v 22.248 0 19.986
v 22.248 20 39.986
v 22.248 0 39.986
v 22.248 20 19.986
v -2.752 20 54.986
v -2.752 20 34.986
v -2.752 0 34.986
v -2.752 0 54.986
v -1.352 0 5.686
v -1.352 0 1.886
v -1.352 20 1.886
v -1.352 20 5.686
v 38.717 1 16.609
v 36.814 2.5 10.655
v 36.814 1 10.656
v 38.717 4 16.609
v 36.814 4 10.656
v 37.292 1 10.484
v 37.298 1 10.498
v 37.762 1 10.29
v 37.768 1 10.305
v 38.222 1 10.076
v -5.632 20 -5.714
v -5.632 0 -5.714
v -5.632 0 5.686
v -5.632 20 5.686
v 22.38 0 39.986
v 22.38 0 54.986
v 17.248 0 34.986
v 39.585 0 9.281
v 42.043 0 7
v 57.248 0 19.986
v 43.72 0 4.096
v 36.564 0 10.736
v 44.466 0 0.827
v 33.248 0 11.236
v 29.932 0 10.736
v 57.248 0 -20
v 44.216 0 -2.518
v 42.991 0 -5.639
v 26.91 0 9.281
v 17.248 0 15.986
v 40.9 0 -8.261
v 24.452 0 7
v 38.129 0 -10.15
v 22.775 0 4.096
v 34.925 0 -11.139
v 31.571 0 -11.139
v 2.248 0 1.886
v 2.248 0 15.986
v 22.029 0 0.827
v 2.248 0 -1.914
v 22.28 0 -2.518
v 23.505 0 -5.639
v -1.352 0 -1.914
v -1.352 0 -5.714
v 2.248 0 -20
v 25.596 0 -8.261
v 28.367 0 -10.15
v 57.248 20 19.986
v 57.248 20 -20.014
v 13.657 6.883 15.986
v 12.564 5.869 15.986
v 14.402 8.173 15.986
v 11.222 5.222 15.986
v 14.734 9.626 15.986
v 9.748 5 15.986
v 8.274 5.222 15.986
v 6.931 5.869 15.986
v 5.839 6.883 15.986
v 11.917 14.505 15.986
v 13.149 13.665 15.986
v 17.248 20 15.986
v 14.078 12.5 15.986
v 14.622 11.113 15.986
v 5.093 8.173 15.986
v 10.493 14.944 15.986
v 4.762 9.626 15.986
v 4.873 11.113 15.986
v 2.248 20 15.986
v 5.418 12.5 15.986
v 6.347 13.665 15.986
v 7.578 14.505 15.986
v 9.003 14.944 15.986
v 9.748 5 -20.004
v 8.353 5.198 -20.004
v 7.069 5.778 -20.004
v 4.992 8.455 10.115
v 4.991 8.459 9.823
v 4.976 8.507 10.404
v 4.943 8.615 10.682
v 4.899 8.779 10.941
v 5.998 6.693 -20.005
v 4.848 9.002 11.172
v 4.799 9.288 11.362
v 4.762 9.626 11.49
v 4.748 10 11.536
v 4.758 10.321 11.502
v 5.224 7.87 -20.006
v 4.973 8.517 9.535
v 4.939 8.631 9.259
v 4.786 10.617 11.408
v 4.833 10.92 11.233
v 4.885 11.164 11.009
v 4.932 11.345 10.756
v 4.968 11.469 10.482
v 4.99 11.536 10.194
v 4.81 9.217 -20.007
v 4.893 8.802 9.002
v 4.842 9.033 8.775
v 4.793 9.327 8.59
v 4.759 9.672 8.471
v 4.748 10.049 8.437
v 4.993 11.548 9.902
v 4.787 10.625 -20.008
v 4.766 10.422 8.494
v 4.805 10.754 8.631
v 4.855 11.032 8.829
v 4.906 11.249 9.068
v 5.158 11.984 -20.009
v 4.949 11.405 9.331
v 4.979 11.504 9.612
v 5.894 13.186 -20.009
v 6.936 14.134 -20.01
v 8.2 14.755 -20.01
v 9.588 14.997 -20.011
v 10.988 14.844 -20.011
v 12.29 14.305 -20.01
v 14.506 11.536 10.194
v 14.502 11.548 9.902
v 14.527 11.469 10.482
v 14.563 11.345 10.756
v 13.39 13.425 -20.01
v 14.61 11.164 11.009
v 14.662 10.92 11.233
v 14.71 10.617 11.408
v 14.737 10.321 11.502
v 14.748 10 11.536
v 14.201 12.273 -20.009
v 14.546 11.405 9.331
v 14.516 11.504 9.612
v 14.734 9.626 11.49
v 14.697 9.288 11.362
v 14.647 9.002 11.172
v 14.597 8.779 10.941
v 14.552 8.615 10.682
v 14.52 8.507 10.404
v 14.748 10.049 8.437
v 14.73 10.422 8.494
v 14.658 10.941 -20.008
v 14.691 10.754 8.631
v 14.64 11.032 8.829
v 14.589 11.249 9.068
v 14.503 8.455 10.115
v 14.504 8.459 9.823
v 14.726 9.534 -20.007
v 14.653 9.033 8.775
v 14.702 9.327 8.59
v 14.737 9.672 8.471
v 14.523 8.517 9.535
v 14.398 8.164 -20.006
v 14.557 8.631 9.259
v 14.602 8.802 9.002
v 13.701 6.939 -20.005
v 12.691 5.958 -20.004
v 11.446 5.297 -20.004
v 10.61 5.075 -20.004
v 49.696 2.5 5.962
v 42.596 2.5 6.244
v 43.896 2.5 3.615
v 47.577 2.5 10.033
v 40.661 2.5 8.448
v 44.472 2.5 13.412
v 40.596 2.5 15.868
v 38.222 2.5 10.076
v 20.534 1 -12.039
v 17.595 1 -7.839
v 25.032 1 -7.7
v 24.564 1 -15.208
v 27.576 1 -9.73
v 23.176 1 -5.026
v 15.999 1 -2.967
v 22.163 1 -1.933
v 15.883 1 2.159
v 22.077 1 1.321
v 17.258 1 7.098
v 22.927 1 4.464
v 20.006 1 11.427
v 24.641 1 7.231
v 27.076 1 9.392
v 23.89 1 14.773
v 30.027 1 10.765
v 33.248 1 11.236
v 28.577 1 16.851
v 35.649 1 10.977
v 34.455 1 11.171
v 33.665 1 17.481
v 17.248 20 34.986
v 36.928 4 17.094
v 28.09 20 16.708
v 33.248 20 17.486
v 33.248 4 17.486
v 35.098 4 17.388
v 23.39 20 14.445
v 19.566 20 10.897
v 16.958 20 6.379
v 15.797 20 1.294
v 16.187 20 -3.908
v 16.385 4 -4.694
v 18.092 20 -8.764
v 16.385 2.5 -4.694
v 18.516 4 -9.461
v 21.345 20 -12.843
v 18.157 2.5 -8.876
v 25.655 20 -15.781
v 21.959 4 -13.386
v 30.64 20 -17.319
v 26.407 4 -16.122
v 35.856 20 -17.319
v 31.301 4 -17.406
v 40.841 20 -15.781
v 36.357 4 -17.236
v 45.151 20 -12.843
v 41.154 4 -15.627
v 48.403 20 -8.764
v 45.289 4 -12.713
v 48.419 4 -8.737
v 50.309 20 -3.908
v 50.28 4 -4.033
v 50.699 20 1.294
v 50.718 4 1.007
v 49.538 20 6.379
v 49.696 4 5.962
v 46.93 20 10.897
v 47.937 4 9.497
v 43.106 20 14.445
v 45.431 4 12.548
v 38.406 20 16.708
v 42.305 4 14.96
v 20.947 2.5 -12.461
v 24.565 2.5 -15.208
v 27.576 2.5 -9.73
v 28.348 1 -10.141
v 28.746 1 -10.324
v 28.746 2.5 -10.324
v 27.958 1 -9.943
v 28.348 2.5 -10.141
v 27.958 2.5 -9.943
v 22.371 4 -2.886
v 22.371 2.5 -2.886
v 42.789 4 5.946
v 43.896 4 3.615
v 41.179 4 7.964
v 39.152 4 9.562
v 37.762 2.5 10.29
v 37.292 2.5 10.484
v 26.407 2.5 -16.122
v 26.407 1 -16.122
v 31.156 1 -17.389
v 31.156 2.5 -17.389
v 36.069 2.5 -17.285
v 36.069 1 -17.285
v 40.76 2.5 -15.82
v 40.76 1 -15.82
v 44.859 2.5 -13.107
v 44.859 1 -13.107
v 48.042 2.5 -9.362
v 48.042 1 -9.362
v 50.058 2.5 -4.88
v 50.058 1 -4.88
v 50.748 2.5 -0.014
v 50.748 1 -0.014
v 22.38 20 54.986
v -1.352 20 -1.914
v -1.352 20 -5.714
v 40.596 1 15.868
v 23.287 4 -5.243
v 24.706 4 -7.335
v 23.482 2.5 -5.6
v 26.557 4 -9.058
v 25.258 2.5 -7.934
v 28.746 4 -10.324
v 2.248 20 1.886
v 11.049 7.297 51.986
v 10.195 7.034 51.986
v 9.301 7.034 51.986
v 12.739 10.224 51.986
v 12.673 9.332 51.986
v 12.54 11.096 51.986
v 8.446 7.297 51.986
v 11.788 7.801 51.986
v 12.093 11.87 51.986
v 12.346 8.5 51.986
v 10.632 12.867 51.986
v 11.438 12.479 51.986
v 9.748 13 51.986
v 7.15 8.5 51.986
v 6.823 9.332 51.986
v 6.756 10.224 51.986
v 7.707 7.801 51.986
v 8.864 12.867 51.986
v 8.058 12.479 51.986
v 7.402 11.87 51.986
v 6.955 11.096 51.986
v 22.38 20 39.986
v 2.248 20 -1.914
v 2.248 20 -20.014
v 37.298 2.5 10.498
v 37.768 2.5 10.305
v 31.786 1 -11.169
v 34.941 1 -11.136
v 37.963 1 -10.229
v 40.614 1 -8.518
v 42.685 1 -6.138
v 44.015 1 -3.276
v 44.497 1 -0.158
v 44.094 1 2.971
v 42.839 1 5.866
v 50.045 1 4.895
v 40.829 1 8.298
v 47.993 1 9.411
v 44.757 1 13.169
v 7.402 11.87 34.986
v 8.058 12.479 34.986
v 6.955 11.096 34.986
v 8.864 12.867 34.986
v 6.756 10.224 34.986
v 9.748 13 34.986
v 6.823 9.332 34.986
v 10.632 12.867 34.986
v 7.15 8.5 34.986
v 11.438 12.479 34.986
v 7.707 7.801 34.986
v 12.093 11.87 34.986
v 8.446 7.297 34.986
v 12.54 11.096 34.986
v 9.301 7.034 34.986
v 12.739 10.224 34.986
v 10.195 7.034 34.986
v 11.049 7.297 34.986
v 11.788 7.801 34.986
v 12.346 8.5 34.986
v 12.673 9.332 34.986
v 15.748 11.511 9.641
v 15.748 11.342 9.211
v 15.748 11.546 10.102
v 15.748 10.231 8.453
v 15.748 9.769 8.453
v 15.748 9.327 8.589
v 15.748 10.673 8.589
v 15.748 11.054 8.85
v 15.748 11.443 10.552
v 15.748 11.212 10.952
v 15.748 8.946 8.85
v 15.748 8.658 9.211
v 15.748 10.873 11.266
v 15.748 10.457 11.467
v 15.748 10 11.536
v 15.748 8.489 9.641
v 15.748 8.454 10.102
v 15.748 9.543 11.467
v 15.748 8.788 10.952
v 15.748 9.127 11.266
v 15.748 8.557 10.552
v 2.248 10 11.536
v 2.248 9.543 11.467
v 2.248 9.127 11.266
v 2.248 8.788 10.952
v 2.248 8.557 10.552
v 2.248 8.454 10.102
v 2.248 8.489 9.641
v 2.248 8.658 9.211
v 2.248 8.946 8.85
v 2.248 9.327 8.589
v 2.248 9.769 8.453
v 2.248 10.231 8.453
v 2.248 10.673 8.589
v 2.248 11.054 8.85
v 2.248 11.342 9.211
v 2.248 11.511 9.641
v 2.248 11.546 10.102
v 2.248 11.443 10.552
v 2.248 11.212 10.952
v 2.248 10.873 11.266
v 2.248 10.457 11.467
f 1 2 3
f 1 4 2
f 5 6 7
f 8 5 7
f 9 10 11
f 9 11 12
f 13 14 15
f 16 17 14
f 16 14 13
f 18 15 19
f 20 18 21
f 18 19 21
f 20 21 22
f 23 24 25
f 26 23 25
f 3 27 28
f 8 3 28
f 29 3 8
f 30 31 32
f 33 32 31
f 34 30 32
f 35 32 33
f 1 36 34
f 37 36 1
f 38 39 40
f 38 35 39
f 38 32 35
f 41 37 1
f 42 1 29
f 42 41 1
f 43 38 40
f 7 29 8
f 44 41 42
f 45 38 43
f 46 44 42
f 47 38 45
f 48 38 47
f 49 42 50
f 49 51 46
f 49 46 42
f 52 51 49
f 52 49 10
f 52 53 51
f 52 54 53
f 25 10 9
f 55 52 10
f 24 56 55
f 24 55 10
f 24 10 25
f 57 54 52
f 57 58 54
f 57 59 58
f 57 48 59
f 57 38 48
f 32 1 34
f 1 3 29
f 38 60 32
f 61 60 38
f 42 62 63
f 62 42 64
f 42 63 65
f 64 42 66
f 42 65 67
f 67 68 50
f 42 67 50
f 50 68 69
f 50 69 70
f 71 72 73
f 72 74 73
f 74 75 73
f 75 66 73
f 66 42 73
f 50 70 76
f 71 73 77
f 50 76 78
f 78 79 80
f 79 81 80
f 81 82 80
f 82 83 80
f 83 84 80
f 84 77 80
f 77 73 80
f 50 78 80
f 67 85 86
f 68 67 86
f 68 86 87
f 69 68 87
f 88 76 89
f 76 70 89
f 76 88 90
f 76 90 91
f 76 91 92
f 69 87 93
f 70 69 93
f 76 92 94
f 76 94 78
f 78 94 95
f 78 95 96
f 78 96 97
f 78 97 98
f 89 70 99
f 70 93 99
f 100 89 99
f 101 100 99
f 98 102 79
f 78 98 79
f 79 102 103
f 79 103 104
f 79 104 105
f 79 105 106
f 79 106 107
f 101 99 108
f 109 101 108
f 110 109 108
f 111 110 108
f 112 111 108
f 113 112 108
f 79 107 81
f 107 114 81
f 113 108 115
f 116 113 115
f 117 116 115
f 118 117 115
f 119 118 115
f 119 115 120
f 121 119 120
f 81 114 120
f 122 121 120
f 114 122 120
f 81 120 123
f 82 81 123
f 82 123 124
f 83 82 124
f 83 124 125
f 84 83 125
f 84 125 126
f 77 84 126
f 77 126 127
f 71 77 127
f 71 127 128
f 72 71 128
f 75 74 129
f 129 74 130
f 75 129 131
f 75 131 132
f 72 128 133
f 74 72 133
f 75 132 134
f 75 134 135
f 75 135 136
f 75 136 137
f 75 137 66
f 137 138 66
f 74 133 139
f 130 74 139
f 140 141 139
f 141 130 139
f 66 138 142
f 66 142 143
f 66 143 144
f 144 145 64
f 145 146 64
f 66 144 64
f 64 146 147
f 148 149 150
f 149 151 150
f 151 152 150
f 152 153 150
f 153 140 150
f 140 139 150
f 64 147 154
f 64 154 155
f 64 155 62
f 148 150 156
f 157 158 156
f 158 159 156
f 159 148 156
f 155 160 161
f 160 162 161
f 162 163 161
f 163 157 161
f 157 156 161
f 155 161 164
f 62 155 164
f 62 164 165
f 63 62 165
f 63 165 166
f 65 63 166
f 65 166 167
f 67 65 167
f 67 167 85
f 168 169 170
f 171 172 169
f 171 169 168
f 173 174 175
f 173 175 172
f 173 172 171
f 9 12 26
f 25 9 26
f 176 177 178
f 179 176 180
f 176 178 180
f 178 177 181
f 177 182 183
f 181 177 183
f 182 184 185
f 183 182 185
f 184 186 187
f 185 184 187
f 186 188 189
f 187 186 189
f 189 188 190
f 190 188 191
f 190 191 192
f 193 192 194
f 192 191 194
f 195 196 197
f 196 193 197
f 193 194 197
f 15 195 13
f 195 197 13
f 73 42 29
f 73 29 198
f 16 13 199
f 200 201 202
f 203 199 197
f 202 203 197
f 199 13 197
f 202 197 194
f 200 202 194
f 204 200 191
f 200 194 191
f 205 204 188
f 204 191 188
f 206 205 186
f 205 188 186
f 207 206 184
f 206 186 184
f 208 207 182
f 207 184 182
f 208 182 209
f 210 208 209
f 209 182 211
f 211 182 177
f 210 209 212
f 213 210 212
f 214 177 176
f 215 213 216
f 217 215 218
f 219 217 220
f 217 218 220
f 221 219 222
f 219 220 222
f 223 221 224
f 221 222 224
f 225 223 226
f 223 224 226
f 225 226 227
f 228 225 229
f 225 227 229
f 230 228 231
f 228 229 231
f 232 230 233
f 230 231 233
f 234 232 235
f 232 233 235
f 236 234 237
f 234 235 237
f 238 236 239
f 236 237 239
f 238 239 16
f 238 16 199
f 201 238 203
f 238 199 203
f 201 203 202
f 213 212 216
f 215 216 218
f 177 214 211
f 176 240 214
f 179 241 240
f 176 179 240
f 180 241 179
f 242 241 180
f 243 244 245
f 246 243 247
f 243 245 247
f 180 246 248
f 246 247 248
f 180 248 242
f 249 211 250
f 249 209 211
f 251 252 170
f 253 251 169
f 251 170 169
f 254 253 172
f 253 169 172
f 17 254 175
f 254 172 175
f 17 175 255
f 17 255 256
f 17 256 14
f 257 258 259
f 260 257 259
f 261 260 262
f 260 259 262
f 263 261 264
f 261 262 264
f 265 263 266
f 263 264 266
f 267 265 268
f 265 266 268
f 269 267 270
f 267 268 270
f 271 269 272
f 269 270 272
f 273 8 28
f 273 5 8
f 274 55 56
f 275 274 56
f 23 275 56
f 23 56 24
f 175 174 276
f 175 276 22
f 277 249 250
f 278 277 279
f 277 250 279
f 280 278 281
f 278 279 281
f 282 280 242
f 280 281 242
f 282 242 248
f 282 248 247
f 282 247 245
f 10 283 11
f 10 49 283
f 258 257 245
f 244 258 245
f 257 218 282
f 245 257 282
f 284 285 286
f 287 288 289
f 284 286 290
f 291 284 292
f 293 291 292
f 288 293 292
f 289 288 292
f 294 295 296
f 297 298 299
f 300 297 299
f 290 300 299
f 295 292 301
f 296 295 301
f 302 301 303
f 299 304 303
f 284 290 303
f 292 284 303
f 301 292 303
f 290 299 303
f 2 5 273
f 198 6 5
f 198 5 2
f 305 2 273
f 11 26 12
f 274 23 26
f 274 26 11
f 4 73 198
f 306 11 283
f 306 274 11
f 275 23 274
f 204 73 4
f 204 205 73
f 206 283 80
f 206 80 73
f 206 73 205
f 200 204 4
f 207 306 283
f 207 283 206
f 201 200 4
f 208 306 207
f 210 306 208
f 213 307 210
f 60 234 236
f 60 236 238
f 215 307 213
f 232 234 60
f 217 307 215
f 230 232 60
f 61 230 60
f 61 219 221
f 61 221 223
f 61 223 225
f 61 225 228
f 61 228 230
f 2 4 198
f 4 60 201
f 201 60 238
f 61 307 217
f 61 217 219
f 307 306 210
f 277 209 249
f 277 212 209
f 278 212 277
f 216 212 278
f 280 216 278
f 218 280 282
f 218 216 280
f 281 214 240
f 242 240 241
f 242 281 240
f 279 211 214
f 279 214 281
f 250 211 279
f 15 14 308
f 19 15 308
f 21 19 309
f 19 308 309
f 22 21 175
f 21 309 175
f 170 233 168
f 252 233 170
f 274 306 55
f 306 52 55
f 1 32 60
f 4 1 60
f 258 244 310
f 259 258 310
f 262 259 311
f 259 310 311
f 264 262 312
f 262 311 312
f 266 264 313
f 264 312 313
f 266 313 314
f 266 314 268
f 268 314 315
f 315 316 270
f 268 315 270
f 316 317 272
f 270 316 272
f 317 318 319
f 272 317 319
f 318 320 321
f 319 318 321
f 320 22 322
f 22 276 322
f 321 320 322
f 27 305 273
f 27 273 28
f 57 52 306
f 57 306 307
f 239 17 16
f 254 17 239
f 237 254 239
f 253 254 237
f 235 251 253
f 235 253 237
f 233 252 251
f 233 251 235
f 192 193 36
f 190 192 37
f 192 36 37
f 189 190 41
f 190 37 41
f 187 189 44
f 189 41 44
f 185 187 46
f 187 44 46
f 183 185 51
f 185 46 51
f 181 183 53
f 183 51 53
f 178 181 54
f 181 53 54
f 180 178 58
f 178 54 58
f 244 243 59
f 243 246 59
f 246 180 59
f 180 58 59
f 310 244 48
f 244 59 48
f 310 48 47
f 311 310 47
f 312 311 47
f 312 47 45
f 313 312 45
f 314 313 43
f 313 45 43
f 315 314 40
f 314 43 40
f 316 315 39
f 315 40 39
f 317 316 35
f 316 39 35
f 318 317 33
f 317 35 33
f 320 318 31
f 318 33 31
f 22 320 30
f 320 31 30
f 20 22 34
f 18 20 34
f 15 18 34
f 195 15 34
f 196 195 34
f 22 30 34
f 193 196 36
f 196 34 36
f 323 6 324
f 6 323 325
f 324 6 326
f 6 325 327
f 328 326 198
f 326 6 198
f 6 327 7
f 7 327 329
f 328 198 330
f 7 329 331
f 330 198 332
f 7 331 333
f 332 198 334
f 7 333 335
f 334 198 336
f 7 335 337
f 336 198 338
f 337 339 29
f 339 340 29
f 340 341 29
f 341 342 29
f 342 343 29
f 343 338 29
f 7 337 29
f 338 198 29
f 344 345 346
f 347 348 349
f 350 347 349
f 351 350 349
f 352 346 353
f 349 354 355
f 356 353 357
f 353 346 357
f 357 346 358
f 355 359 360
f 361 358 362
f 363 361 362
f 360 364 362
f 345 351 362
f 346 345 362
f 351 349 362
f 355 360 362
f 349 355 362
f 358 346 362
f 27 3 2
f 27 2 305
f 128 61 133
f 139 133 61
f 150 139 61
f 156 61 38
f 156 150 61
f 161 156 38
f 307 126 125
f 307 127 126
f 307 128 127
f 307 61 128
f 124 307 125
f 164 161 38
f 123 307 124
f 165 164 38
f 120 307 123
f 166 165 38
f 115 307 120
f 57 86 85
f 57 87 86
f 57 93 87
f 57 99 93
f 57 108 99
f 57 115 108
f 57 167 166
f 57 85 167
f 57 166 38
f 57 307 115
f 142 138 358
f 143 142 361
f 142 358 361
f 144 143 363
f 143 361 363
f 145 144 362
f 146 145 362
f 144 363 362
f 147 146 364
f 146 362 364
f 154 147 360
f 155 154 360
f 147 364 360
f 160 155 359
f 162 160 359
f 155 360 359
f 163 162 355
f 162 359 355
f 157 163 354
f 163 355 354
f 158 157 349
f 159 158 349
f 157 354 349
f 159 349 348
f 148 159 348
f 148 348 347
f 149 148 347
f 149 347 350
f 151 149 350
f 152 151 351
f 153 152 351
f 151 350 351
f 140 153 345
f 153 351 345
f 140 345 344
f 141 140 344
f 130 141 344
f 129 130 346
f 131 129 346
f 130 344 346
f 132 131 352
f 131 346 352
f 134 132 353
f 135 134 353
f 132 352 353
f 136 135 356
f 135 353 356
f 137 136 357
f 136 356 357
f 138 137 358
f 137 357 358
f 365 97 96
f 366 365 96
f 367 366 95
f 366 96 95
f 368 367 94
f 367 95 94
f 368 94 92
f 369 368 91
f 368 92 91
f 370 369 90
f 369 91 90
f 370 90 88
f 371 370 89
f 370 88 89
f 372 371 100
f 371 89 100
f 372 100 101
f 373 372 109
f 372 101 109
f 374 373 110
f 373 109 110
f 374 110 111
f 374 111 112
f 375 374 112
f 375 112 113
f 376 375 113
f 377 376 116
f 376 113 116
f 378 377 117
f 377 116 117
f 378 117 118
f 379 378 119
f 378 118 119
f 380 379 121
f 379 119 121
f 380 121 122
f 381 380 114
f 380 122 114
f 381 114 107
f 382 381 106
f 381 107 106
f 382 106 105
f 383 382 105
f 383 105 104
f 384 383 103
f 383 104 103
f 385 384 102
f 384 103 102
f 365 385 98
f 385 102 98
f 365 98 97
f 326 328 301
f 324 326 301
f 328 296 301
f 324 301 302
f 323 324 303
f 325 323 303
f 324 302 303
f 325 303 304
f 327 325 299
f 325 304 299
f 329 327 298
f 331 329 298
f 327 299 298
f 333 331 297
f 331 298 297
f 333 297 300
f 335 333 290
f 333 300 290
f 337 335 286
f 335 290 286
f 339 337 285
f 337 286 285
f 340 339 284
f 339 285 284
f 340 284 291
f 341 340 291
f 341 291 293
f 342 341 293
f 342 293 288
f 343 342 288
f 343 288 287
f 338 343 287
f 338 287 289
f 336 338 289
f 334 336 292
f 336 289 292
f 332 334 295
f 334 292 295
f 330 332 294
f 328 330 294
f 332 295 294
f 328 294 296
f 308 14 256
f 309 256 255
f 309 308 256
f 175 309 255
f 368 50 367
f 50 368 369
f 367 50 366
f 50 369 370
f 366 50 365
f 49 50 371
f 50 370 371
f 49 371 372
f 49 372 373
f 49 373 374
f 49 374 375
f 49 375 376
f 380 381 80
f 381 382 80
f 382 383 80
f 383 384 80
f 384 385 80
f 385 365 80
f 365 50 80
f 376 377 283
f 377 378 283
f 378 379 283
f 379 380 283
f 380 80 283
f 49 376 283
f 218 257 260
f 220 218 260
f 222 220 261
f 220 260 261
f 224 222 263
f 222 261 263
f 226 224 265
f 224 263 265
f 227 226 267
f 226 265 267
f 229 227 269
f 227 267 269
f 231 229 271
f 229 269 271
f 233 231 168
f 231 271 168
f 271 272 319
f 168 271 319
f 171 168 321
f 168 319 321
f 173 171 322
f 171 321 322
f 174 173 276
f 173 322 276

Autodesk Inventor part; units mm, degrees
ref_plane "YZ Plane" through (0, 0, 0) normal (1, 0, 0) x (0, 1, 0)
ref_plane "XZ Plane" through (0, 0, 0) normal (0, 1, 0) x (-1, 0, 0)
ref_plane "XY Plane" through (0, 0, 0) normal (0, 0, 1) x (1, 0, 0)
sketch "Sketch1" plane through (0, 0, 0) normal (0, 1, 0) x (-1, 0, 0)
  line L0 (-2.2478, 1.8858) -> (1.3522, 1.8858)
  line L1 (-2.2478, 1.8858) -> (-2.2478, -1.9142)
  line L2 (-2.2478, -1.9142) -> (1.3522, -1.9142)
  line L3 (1.3522, 1.8858) -> (1.3522, 5.6858)
  line L4 (1.3522, -1.9142) -> (1.3522, -5.7142)
  line L5 (1.3522, -5.7142) -> (5.6322, -5.7142)
  line L6 (5.6322, -5.7142) -> (5.6322, 5.6858)
  line L7 (1.3522, 5.6858) -> (5.6322, 5.6858)
  point P0 (0, 0)
  dimension "d1" = 3.6
  dimension "d2" = 3.8
  dimension "d3" = 3.8
  dimension "d4" = 3.8
  dimension "d6" = 4.28
  dimension "d7" = 11.4
  dimension "d98" = 3.6
extrude "Extrusion1" add sketch "Sketch1" along normal blind 20
sketch "Sketch2" plane through (2.2478, 0, 1.8858) normal (1, 0, 0) x (0, 0, -1)
  line L0 (3.8, 0) -> (7.6, 0) projected
  line L1 (0, 20) -> (3.8, 20) projected
  line L2 (1.9, 20) -> (-18.1, 20)
  line L3 (21.9, 20) -> (1.9, 20)
  line L4 (1.8858, 0) -> (21.8858, 0)
  line L5 (0, 0) -> (3.8, 0) projected
  line L6 (1.8858, 0) -> (-18.1, 0)
  line L7 (-18.1, 0) -> (-18.1, 20)
  line L8 (21.9, 20) -> (21.8858, 0)
  point P0 (12, 0)
  point P1 (3.8, 0)
  dimension "d17" = 20
  dimension "d26" = 20
  dimension "d27" = 20
extrude "Extrusion2" add sketch "Sketch2" along normal blind 55
sketch "Sketch4" plane through (0, 20, 0) normal (0, 1, 0) x (1, 0, 0)
  line L0 (2.2478, 1.9142) -> (-1.3522, 1.9142) projected
  line L1 (2.2478, -1.8858) -> (2.2478, 1.9142)
  line L2 (2.2478, 0.0142) -> (33.2478, 0.0142)
  point P0 (0, 0)
  dimension "d16" = 31
sketch "Sketch5" plane through (0, 20, 0) normal (0, 1, 0) x (1, 0, 0)
  point P0 (0, 0)
hole "Hole2" at (33.2478, 20, -0.0142) direction (0, -1, 0) diameter 22.5 depth 22.5 counterbore diameter 35 counterbore depth 19
sketch "Sketch6" plane through (0, 0, 0) normal (0, -1, 0) x (1, 0, 0)
  point P0 (0, 0)
sketch "Sketch7" plane through (2.2478, 0, 19.9858) normal (0, 0, 1) x (1, 0, 0)
  line L0 (0, 0) -> (55, 0) projected
  line L1 (0, 0) -> (55, 0) projected
  line L2 (15, 0) -> (15, 20)
  line L3 (15, 20) -> (20, 20)
  line L4 (0, 20) -> (55, 20) projected
  line L5 (20, 20) -> (20, 0)
  line L6 (42.25, 0) -> (19.75, 0) projected
  line L7 (15, 0) -> (20, 0)
  point P0 (-2.2478, 0)
  dimension "d41" = 5
extrude "Extrusion4" add sketch "Sketch7" along normal blind 20
sketch "Sketch10" plane through (17.2478, 0, 19.9858) normal (-1, 0, 0) x (0, 0, 1)
  line L0 (0, 20) -> (20, 20) projected
  line L1 (0, 0) -> (20, 0) projected
  line L2 (20, 20) -> (15, 20)
  line L3 (15, 20) -> (15, 0)
  line L4 (15, 0) -> (20, 0)
  line L5 (20, 0) -> (20, 20)
  point P0 (-19.9858, 0)
  point P1 (20, 0)
  dimension "d42" = 5
extrude "Extrusion6" add sketch "Sketch10" along normal blind 20
sketch "Sketch11" plane through (2.2478, 0, 19.9858) normal (0, 0, 1) x (1, 0, 0)
  point P0 (-2.2478, 0)
sketch "Sketch12" plane through (2.2478, 0, 19.9858) normal (0, 0, 1) x (1, 0, 0)
  point P0 (-2.2478, 0)
sketch "Sketch13" plane through (2.2478, 0, 19.9858) normal (0, 0, 1) x (1, 0, 0)
  point P0 (-2.2478, 0)
sketch "Sketch14" plane through (2.2478, 0, 19.9858) normal (0, 0, 1) x (1, 0, 0)
  line L0 (0, 0) -> (15, 0) projected
  line L1 (7.5, 0) -> (7.5, 10)
  line L2 (0, 20) -> (15, 20) projected
  point P0 (-2.2478, 0)
  dimension "d45" = 10
hole "Hole3" at (9.7478, 10, 19.9858) direction (0, 0, -1) diameter 10 depth 49.5
sketch "Sketch15" plane through (2.2478, 0, 39.9858) normal (0, 0, 1) x (1, 0, 0)
  line L0 (-3.6, 20) -> (-7.88, 20) projected
  line L1 (42.25, 0) -> (19.75, 0) projected
  line L2 (-5.0624, 20) -> (20.1325, 20)
  line L3 (20.1325, 20) -> (20.1325, 0)
  line L4 (20.1325, 0) -> (-5.0624, 0)
  line L5 (20, 20) -> (-5, 20) projected
  line L6 (20, 0) -> (-5, 0) projected
  line L7 (-5, 20) -> (-5, 0)
  point P0 (-2.2478, 0)
  point P1 (19.75, 0)
extrude "Extrusion7" add sketch "Sketch15" along normal blind 15
sketch "Sketch18" plane through (0, 20, 0) normal (0, 1, 0) x (1, 0, 0)
  line L0 (2.2478, 1.9142) -> (2.2478, 20) projected
  line L1 (2.2478, 20) -> (2.2478, -54.9858)
  line L2 (22.3802, -54.9858) -> (-2.7522, -54.9858) projected
  point P0 (0, 0)
  dimension "d73" = 74.9858
sketch "Sketch19" plane through (2.2478, 0, 1.8858) normal (-1, 0, 0) x (0, 0, 1)
  circle A0 centre (10, 10) radius 1.55 projected
  line L0 (18.1, 20) -> (18.1, 0) projected
  line L1 (18.1, 10) -> (8.1, 10)
  point P0 (-1.8858, 0)
  dimension "d75" = 10
hole "Hole6" at (2.2478, 10, 9.9858) direction (1, 0, 0) diameter 3.1 depth 13.5
sketch "Sketch20" plane through (2.2478, 0, 1.8858) normal (-1, 0, 0) x (0, 0, 1)
  circle A0 centre (8.1, 10) radius 1.55 projected
  line L0 (8.1, 10) -> (33.1, 10)
  line L1 (33.1, 20) -> (33.1, 0) projected
  point P0 (-1.8858, 0)
  dimension "d83" = 25
sketch "Sketch21" plane through (17.2478, 0, 19.9858) normal (-1, 0, 0) x (0, 0, 1)
  point P0 (-19.9858, 0)
sketch "Sketch22" plane through (0, 20, 0) normal (0, 1, 0) x (1, 0, 0)
  line L0 (2.2478, -19.9858) -> (17.2478, -19.9858) projected
  line L1 (2.2478, -19.9858) -> (17.2478, -19.9858)
  line L2 (17.2478, -19.9858) -> (17.2478, -15.9858)
  line L3 (17.2478, -15.9858) -> (2.2478, -15.9858)
  line L4 (2.2478, -15.9858) -> (2.2478, -19.9858)
  point P0 (0, 0)
  dimension "d84" = 15
  dimension "d85" = 4
extrude "Extrusion8" cut sketch "Sketch22" against normal blind 22.25
sketch "Sketch23" plane through (17.2478, 0, 34.9858) normal (0, 0, -1) x (-1, 0, 0)
  circle A0 centre (10, 10) radius 2.5 projected
  circle A1 centre (7.5, 10) radius 3
  point P0 (17.2478, 0)
  dimension "d88" = 6
hole "Hole7" at (9.7478, 10, 34.9858) direction (0, 0, 1) diameter 6 depth 17
sketch "Sketch24" plane through (2.2478, 0, 1.8858) normal (-1, 0, 0) x (0, 0, 1)
  circle A0 centre (8.1, 10) radius 1.55 projected
  line L0 (9.65, 10) -> (14.1, 10)
  line L1 (14.1, 5) -> (14.1, 15) projected
  point P0 (-1.8858, 0)
  dimension "d96" = 4.45
sketch "Sketch25" plane through (-2.7522, 0, 19.9858) normal (-1, 0, 0) x (0, 0, 1)
  line L0 (15, 0) -> (15, 20) projected
  line L1 (15, 10) -> (35, 10)
  line L2 (35, 0) -> (35, 20) projected
  point P0 (-19.9858, 0)
  dimension "d97" = 20
ref_plane "Work Plane2" through (33.2478, 0.5, -0.0142) normal (0, 1, 0) x (1, 0, 0)
sketch "Sketch26" plane through (33.2478, 1, -0.0142) normal (0, 1, 0) x (1, 0, 0)
  circle A0 centre (0, 0) radius 17.5
  point P0 (-33.2478, -0.0142)
extrude "Extrusion9" add sketch "Sketch26" along normal blind 3
sketch "Sketch27" plane through (33.2478, 4, -0.0142) normal (0, 1, 0) x (1, 0, 0)
  circle A0 centre (0, 0) radius 17.5
  point P0 (-33.2478, -0.0142)
sketch "Sketch29" plane through (33.2478, 1, -0.0142) normal (0, -1, 0) x (1, 0, 0)
  circle A0 centre (0, 0) radius 17.5
  point P0 (-33.2478, 0.0142)
extrude "Extrusion10" cut sketch "Sketch29" against normal blind 1.5
sketch "Sketch30" plane through (33.2478, 2.5, -0.0142) normal (0, -1, 0) x (1, 0, 0)
  circle A0 centre (0, 0) radius 11.25
  point P0 (-33.2478, 0.0142)
extrude "Extrusion11" cut sketch "Sketch30" against normal blind 24
sketch "Sketch31" plane through (33.2478, 4, -0.0142) normal (0, 1, 0) x (1, 0, 0)
  circle A0 centre (0, 0) radius 17.5 projected
  arc A1 (16.4479, -5.9763) -> (-4.1987, 16.9888) centre (0, 0) ccw
  arc A2 (-16.8627, 4.6795) -> (5.4693, -16.6234) centre (0, 0) ccw
  line L0 (5.4693, -16.6234) -> (3.5666, -10.6697)
  circle A3 centre (0, 0) radius 11.25 projected
  line L1 (-16.8627, 4.6795) -> (-10.8414, 2.861)
  line L2 (16.4479, -5.9763) -> (10.6485, -3.6292)
  line L3 (-6.8407, 16.1076) -> (-4.502, 10.3099)
  point P0 (-33.2478, -0.0142)
  point P1 (-10.8773, 2.8718)
  point P2 (5.4693, -16.6234)
extrude "Extrusion12" cut sketch "Sketch31" against normal blind 2.25 contours A0 L2 A3 L3 | A0 L1 A3 L0
sketch "Sketch32" plane through (33.2478, 4, -0.0142) normal (0, 1, 0) x (1, 0, 0)
  arc A0 (5.4693, -16.6234) -> (16.4479, -5.9763) centre (0, 0) ccw projected
  arc A1 (5.4693, -16.6234) -> (7.348, -15.8826) centre (0, 0) ccw
  line L0 (3.5666, -10.6697) -> (5.4693, -16.6234) projected
  line L1 (5.4693, -16.6234) -> (3.5666, -10.6697)
  line L2 (7.348, -15.8826) -> (4.9745, -10.0904)
  arc A2 (3.5666, -10.6697) -> (10.6485, -3.6292) centre (0, 0) ccw projected
  arc A3 (3.5666, -10.6697) -> (4.9745, -10.0904) centre (1.7167, -4.1725) ccw
  arc A4 (-6.8407, 16.1076) -> (-16.8627, 4.6795) centre (0, 0) ccw projected
  arc A5 (-6.8407, 16.1076) -> (-8.6833, 15.1938) centre (0, 0) ccw
  line L3 (-6.8407, 16.1076) -> (-4.502, 10.3099) projected
  line L4 (-6.8407, 16.1076) -> (-4.502, 10.3099)
  line L5 (-8.6833, 15.1938) -> (-5.6713, 9.7159)
  arc A6 (-4.502, 10.3099) -> (-10.8773, 2.8718) centre (0, 0) ccw projected
  arc A7 (-4.502, 10.3099) -> (-5.6713, 9.7159) centre (0, 0) ccw
  point P0 (-33.2478, -0.0142)
extrude "Extrusion13" add sketch "Sketch32" against normal blind 3 contours L0 A3 L2 A0 | L3 A6 L5 A4
properties part number "spoutextrusion"
